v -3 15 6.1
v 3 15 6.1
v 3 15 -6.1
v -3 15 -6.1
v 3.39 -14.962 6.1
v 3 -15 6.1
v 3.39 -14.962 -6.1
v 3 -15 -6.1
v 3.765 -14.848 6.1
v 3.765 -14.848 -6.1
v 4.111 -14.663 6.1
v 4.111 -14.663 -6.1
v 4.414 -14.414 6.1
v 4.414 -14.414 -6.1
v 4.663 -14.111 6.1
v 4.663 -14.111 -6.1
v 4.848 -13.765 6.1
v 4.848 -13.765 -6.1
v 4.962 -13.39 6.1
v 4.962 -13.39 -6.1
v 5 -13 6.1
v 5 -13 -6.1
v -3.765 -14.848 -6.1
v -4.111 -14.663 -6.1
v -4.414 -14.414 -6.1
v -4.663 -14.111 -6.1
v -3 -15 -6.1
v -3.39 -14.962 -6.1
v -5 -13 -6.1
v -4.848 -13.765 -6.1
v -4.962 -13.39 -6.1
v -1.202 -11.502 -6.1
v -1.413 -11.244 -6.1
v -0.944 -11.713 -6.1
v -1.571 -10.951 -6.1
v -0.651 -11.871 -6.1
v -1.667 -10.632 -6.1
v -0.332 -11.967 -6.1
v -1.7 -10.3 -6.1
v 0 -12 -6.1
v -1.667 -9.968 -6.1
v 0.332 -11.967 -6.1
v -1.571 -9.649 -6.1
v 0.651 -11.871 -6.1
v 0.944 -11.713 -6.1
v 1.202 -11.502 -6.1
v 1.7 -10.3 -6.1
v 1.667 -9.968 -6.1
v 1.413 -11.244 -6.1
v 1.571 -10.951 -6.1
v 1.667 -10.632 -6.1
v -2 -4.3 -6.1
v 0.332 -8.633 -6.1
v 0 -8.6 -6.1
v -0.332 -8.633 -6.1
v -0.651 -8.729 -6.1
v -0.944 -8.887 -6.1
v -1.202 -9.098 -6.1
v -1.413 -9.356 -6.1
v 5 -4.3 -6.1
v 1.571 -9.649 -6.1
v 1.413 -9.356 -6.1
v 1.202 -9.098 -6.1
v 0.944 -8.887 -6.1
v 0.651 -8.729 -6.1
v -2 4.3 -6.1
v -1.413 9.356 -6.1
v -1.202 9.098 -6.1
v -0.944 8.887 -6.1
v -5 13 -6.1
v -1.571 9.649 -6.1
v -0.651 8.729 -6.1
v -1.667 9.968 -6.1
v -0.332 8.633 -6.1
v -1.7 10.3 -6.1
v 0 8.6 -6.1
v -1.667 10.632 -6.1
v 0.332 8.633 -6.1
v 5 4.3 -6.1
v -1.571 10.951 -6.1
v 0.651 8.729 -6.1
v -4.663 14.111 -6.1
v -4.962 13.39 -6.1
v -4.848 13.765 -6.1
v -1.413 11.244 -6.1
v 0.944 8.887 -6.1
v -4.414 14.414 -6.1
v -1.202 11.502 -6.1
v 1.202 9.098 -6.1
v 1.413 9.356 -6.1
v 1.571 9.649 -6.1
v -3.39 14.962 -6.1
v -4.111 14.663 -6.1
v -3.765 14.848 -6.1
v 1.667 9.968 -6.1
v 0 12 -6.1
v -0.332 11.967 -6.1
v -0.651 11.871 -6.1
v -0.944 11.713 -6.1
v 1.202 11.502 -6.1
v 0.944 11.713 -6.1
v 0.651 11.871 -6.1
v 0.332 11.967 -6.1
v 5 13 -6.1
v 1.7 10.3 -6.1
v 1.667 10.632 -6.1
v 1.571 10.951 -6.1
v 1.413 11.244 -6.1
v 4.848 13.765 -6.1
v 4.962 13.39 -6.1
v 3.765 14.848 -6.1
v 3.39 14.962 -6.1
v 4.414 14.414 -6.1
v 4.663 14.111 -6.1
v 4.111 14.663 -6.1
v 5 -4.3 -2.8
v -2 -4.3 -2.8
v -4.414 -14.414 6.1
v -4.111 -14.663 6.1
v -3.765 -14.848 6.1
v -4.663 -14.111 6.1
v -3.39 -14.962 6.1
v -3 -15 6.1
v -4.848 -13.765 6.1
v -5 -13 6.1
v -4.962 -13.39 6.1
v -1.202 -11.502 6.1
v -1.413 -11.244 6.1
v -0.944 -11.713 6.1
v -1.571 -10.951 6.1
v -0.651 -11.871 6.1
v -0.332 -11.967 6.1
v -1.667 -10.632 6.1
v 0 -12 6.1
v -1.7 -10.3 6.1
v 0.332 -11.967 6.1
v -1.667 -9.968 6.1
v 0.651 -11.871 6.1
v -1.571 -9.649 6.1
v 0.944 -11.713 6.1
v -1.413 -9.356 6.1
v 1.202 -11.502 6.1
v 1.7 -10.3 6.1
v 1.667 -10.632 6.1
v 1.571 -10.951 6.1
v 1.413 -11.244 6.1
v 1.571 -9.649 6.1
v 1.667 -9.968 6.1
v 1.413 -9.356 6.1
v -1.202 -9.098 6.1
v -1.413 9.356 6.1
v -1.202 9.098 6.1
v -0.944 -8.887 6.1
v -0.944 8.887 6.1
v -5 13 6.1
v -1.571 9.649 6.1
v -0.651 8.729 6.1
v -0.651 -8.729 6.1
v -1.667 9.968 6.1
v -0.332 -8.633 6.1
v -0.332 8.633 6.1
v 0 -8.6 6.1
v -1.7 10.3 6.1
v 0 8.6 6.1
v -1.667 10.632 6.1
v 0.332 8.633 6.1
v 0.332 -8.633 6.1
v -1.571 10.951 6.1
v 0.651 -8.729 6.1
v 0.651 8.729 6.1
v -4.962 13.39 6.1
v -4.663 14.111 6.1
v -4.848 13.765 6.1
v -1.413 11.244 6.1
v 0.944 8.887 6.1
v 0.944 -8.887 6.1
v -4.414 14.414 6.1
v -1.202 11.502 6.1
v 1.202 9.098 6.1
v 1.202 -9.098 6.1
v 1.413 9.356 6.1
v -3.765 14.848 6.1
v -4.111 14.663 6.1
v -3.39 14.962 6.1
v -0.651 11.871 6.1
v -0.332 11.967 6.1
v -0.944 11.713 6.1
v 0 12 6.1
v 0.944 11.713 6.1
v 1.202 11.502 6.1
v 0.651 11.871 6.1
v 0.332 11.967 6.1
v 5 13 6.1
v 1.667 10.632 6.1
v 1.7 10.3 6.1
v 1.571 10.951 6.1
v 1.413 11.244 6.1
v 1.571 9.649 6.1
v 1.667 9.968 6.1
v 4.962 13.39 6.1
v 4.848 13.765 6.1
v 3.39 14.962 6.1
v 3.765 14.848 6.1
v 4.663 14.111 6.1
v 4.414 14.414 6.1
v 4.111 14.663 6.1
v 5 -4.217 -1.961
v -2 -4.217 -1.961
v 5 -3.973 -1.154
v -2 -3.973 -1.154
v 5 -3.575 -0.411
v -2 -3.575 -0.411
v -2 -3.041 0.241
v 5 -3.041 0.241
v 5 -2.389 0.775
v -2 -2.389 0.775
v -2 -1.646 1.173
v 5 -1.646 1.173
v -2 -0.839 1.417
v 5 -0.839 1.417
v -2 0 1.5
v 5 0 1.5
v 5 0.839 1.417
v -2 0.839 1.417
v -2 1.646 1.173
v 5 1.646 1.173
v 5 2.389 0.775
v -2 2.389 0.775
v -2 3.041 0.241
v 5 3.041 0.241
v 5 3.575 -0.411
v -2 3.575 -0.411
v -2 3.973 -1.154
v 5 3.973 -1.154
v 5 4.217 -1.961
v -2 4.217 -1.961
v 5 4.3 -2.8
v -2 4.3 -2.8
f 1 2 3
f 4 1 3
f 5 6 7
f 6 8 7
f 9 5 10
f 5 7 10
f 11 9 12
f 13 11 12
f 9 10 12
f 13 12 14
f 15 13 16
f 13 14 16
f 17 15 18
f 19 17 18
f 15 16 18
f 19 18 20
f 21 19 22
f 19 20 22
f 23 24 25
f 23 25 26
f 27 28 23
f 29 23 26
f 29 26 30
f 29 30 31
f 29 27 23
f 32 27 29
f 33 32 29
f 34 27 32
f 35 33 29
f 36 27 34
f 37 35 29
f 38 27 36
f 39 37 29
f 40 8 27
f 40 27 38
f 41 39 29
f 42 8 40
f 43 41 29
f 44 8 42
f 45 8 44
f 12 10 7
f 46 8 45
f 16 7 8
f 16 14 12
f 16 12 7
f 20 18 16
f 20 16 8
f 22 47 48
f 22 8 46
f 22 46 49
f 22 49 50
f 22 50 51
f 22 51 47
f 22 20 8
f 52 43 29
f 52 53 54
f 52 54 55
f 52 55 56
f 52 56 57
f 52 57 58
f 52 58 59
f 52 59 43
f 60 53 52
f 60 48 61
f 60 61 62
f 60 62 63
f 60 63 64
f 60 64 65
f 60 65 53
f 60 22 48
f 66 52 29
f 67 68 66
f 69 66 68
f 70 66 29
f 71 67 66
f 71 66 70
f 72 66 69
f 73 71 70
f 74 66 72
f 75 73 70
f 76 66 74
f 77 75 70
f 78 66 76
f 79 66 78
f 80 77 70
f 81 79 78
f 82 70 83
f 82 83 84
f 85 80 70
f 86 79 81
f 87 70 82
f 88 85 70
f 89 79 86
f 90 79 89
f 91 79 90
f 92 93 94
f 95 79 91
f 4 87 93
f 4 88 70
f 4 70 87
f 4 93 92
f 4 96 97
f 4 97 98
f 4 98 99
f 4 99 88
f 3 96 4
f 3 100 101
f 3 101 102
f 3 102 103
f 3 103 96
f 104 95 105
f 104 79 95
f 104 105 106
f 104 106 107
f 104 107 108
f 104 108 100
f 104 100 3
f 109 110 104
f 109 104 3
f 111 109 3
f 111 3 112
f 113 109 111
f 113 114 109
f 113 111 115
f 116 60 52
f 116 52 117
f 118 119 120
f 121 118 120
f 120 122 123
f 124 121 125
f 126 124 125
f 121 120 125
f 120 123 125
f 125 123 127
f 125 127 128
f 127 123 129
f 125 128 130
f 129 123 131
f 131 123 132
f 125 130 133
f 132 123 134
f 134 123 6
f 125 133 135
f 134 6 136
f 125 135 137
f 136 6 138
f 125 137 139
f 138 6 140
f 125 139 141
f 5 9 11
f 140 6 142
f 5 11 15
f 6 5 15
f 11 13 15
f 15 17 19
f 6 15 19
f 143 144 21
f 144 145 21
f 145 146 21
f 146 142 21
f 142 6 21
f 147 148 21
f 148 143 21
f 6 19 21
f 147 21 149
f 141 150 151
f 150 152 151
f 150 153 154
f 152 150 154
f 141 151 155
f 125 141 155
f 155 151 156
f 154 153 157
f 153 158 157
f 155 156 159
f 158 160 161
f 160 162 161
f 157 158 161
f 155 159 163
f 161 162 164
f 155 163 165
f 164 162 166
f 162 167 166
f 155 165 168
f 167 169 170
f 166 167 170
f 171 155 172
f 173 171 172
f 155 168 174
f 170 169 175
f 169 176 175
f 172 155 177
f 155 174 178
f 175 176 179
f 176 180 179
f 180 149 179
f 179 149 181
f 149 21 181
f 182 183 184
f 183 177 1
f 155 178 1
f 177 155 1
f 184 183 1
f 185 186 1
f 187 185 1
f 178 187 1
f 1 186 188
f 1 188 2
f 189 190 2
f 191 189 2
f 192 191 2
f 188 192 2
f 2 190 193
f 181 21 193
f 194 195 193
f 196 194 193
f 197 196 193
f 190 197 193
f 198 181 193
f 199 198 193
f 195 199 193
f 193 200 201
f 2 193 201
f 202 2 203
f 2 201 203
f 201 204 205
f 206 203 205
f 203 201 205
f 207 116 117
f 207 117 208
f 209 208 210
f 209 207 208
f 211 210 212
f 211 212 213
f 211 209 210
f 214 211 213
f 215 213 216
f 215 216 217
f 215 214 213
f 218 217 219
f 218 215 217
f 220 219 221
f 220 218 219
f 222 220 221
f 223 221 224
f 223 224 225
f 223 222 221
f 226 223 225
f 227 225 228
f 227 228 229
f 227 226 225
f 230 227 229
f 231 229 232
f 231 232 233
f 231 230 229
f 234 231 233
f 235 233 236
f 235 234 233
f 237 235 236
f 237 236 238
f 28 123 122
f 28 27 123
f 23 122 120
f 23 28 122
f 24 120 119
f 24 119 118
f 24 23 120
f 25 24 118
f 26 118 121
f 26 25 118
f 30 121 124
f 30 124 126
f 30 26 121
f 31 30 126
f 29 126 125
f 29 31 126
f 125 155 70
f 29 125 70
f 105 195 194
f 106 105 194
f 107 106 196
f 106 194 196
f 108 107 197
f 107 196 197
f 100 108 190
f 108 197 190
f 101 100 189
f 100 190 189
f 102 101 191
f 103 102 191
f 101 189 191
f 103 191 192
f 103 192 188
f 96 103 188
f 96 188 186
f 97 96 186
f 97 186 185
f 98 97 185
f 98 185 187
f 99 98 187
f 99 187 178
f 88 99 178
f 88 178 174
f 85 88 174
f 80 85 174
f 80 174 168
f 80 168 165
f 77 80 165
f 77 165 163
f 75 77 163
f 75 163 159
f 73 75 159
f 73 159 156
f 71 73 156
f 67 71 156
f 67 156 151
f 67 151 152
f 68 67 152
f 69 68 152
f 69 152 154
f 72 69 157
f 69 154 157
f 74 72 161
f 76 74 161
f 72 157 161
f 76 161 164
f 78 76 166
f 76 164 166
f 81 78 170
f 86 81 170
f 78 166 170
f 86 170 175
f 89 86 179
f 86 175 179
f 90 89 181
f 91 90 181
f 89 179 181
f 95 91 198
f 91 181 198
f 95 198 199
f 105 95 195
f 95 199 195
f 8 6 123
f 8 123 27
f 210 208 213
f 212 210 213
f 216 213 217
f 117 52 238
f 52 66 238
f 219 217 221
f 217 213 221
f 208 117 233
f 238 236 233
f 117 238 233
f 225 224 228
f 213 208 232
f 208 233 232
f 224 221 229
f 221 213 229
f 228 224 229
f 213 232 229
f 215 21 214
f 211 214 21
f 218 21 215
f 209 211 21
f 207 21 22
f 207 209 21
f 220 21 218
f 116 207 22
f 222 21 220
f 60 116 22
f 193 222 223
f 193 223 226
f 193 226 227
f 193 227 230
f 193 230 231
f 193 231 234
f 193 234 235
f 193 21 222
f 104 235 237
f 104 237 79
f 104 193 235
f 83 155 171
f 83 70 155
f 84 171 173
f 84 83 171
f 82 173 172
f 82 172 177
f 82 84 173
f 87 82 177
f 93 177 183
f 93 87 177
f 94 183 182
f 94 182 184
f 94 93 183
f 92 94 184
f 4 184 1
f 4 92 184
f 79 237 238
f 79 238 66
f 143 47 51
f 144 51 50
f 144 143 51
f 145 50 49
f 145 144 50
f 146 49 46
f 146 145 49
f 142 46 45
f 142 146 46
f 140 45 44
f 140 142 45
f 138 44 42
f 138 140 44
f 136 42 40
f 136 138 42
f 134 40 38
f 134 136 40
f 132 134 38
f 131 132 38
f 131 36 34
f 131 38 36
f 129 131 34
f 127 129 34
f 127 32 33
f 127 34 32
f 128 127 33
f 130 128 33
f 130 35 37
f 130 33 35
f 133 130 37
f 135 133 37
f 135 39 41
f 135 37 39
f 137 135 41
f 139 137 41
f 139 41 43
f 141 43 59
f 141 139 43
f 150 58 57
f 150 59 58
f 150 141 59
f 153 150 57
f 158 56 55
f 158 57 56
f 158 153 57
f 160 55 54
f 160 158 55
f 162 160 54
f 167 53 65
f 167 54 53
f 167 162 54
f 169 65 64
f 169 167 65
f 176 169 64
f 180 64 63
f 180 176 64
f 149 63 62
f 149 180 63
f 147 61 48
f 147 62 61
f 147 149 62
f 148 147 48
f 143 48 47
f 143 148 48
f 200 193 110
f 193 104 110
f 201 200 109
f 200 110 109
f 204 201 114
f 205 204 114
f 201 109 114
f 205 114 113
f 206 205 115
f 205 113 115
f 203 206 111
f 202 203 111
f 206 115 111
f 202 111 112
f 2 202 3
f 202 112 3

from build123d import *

# Parameters (mm, degrees)
SKETCH1_W           = 12.2
SKETCH1_H           = 30
BOSS_EXTRUDE1_DEPTH = 5
SKETCH5_R           = 4.3
CUT_EXTRUDE2_DEPTH  = 7
SKETCH3_R           = 1.7
CUT_EXTRUDE1_DEPTH  = 20.970978944
FILLET1_R           = 2
FILLET2_R           = 0.1
CUT_EXTRUDE3_DEPTH  = 7


with BuildPart() as part:
    # Sketch1 → Boss-Extrude1 (new, symmetric)
    with BuildSketch(Plane(origin=(0, 0, 0), x_dir=(0, 0, -1), z_dir=(1, 0, 0))):
        Rectangle(SKETCH1_W, SKETCH1_H)
    extrude(amount=BOSS_EXTRUDE1_DEPTH, both=True)

    # Sketch5 → Cut-Extrude2 (cut)
    with BuildSketch(Plane(origin=(5, 0, 0), x_dir=(0, 0, -1), z_dir=(1, 0, 0))):
        with Locations((2.8, 0)):
            Circle(SKETCH5_R)
    extrude(amount=-CUT_EXTRUDE2_DEPTH, mode=Mode.SUBTRACT)

    # Sketch3 → Cut-Extrude1 (cut, through all)
    with BuildSketch(Plane.XY.offset(6.1)):
        with Locations((0, 10.3)):
            Circle(SKETCH3_R)
    cut_extrude1 = extrude(amount=-CUT_EXTRUDE1_DEPTH, mode=Mode.SUBTRACT)

    # Mirror1: Cut-Extrude1 across plane
    add(cut_extrude1.mirror(Plane.ZX), mode=Mode.SUBTRACT)

    # Fillet1
    fillet1_edges = [part.edges().sort_by_distance(p)[0] for p in [
        (5, -15, 0),
        (-5, -15, 0),
        (-5, 15, 0),
        (5, 15, 0),
    ]]
    fillet(fillet1_edges, radius=FILLET1_R)

    # Fillet2
    fillet2_edges = [part.edges().sort_by_distance(p)[0] for p in [
        (1.5, -2.75680975, -6.1),
        (1.5, 2.75680975, -6.1),
    ]]
    fillet(fillet2_edges, radius=FILLET2_R)

    # Sketch6 → Cut-Extrude3 (cut)
    with BuildSketch(Plane(origin=(5, 0, 0), x_dir=(0, 0, -1), z_dir=(1, 0, 0))):
        with BuildLine():
            Line((2.8, 4.3), (6.1, 4.3))
            ThreePointArc((6.1, 4.3), (10.4, 0), (6.1, -4.3))
            Line((6.1, -4.3), (2.8, -4.3))
            ThreePointArc((2.8, -4.3), (-1.5, 0), (2.8, 4.3))
        make_face()
    extrude(amount=-CUT_EXTRUDE3_DEPTH, mode=Mode.SUBTRACT)


solid = part.part
